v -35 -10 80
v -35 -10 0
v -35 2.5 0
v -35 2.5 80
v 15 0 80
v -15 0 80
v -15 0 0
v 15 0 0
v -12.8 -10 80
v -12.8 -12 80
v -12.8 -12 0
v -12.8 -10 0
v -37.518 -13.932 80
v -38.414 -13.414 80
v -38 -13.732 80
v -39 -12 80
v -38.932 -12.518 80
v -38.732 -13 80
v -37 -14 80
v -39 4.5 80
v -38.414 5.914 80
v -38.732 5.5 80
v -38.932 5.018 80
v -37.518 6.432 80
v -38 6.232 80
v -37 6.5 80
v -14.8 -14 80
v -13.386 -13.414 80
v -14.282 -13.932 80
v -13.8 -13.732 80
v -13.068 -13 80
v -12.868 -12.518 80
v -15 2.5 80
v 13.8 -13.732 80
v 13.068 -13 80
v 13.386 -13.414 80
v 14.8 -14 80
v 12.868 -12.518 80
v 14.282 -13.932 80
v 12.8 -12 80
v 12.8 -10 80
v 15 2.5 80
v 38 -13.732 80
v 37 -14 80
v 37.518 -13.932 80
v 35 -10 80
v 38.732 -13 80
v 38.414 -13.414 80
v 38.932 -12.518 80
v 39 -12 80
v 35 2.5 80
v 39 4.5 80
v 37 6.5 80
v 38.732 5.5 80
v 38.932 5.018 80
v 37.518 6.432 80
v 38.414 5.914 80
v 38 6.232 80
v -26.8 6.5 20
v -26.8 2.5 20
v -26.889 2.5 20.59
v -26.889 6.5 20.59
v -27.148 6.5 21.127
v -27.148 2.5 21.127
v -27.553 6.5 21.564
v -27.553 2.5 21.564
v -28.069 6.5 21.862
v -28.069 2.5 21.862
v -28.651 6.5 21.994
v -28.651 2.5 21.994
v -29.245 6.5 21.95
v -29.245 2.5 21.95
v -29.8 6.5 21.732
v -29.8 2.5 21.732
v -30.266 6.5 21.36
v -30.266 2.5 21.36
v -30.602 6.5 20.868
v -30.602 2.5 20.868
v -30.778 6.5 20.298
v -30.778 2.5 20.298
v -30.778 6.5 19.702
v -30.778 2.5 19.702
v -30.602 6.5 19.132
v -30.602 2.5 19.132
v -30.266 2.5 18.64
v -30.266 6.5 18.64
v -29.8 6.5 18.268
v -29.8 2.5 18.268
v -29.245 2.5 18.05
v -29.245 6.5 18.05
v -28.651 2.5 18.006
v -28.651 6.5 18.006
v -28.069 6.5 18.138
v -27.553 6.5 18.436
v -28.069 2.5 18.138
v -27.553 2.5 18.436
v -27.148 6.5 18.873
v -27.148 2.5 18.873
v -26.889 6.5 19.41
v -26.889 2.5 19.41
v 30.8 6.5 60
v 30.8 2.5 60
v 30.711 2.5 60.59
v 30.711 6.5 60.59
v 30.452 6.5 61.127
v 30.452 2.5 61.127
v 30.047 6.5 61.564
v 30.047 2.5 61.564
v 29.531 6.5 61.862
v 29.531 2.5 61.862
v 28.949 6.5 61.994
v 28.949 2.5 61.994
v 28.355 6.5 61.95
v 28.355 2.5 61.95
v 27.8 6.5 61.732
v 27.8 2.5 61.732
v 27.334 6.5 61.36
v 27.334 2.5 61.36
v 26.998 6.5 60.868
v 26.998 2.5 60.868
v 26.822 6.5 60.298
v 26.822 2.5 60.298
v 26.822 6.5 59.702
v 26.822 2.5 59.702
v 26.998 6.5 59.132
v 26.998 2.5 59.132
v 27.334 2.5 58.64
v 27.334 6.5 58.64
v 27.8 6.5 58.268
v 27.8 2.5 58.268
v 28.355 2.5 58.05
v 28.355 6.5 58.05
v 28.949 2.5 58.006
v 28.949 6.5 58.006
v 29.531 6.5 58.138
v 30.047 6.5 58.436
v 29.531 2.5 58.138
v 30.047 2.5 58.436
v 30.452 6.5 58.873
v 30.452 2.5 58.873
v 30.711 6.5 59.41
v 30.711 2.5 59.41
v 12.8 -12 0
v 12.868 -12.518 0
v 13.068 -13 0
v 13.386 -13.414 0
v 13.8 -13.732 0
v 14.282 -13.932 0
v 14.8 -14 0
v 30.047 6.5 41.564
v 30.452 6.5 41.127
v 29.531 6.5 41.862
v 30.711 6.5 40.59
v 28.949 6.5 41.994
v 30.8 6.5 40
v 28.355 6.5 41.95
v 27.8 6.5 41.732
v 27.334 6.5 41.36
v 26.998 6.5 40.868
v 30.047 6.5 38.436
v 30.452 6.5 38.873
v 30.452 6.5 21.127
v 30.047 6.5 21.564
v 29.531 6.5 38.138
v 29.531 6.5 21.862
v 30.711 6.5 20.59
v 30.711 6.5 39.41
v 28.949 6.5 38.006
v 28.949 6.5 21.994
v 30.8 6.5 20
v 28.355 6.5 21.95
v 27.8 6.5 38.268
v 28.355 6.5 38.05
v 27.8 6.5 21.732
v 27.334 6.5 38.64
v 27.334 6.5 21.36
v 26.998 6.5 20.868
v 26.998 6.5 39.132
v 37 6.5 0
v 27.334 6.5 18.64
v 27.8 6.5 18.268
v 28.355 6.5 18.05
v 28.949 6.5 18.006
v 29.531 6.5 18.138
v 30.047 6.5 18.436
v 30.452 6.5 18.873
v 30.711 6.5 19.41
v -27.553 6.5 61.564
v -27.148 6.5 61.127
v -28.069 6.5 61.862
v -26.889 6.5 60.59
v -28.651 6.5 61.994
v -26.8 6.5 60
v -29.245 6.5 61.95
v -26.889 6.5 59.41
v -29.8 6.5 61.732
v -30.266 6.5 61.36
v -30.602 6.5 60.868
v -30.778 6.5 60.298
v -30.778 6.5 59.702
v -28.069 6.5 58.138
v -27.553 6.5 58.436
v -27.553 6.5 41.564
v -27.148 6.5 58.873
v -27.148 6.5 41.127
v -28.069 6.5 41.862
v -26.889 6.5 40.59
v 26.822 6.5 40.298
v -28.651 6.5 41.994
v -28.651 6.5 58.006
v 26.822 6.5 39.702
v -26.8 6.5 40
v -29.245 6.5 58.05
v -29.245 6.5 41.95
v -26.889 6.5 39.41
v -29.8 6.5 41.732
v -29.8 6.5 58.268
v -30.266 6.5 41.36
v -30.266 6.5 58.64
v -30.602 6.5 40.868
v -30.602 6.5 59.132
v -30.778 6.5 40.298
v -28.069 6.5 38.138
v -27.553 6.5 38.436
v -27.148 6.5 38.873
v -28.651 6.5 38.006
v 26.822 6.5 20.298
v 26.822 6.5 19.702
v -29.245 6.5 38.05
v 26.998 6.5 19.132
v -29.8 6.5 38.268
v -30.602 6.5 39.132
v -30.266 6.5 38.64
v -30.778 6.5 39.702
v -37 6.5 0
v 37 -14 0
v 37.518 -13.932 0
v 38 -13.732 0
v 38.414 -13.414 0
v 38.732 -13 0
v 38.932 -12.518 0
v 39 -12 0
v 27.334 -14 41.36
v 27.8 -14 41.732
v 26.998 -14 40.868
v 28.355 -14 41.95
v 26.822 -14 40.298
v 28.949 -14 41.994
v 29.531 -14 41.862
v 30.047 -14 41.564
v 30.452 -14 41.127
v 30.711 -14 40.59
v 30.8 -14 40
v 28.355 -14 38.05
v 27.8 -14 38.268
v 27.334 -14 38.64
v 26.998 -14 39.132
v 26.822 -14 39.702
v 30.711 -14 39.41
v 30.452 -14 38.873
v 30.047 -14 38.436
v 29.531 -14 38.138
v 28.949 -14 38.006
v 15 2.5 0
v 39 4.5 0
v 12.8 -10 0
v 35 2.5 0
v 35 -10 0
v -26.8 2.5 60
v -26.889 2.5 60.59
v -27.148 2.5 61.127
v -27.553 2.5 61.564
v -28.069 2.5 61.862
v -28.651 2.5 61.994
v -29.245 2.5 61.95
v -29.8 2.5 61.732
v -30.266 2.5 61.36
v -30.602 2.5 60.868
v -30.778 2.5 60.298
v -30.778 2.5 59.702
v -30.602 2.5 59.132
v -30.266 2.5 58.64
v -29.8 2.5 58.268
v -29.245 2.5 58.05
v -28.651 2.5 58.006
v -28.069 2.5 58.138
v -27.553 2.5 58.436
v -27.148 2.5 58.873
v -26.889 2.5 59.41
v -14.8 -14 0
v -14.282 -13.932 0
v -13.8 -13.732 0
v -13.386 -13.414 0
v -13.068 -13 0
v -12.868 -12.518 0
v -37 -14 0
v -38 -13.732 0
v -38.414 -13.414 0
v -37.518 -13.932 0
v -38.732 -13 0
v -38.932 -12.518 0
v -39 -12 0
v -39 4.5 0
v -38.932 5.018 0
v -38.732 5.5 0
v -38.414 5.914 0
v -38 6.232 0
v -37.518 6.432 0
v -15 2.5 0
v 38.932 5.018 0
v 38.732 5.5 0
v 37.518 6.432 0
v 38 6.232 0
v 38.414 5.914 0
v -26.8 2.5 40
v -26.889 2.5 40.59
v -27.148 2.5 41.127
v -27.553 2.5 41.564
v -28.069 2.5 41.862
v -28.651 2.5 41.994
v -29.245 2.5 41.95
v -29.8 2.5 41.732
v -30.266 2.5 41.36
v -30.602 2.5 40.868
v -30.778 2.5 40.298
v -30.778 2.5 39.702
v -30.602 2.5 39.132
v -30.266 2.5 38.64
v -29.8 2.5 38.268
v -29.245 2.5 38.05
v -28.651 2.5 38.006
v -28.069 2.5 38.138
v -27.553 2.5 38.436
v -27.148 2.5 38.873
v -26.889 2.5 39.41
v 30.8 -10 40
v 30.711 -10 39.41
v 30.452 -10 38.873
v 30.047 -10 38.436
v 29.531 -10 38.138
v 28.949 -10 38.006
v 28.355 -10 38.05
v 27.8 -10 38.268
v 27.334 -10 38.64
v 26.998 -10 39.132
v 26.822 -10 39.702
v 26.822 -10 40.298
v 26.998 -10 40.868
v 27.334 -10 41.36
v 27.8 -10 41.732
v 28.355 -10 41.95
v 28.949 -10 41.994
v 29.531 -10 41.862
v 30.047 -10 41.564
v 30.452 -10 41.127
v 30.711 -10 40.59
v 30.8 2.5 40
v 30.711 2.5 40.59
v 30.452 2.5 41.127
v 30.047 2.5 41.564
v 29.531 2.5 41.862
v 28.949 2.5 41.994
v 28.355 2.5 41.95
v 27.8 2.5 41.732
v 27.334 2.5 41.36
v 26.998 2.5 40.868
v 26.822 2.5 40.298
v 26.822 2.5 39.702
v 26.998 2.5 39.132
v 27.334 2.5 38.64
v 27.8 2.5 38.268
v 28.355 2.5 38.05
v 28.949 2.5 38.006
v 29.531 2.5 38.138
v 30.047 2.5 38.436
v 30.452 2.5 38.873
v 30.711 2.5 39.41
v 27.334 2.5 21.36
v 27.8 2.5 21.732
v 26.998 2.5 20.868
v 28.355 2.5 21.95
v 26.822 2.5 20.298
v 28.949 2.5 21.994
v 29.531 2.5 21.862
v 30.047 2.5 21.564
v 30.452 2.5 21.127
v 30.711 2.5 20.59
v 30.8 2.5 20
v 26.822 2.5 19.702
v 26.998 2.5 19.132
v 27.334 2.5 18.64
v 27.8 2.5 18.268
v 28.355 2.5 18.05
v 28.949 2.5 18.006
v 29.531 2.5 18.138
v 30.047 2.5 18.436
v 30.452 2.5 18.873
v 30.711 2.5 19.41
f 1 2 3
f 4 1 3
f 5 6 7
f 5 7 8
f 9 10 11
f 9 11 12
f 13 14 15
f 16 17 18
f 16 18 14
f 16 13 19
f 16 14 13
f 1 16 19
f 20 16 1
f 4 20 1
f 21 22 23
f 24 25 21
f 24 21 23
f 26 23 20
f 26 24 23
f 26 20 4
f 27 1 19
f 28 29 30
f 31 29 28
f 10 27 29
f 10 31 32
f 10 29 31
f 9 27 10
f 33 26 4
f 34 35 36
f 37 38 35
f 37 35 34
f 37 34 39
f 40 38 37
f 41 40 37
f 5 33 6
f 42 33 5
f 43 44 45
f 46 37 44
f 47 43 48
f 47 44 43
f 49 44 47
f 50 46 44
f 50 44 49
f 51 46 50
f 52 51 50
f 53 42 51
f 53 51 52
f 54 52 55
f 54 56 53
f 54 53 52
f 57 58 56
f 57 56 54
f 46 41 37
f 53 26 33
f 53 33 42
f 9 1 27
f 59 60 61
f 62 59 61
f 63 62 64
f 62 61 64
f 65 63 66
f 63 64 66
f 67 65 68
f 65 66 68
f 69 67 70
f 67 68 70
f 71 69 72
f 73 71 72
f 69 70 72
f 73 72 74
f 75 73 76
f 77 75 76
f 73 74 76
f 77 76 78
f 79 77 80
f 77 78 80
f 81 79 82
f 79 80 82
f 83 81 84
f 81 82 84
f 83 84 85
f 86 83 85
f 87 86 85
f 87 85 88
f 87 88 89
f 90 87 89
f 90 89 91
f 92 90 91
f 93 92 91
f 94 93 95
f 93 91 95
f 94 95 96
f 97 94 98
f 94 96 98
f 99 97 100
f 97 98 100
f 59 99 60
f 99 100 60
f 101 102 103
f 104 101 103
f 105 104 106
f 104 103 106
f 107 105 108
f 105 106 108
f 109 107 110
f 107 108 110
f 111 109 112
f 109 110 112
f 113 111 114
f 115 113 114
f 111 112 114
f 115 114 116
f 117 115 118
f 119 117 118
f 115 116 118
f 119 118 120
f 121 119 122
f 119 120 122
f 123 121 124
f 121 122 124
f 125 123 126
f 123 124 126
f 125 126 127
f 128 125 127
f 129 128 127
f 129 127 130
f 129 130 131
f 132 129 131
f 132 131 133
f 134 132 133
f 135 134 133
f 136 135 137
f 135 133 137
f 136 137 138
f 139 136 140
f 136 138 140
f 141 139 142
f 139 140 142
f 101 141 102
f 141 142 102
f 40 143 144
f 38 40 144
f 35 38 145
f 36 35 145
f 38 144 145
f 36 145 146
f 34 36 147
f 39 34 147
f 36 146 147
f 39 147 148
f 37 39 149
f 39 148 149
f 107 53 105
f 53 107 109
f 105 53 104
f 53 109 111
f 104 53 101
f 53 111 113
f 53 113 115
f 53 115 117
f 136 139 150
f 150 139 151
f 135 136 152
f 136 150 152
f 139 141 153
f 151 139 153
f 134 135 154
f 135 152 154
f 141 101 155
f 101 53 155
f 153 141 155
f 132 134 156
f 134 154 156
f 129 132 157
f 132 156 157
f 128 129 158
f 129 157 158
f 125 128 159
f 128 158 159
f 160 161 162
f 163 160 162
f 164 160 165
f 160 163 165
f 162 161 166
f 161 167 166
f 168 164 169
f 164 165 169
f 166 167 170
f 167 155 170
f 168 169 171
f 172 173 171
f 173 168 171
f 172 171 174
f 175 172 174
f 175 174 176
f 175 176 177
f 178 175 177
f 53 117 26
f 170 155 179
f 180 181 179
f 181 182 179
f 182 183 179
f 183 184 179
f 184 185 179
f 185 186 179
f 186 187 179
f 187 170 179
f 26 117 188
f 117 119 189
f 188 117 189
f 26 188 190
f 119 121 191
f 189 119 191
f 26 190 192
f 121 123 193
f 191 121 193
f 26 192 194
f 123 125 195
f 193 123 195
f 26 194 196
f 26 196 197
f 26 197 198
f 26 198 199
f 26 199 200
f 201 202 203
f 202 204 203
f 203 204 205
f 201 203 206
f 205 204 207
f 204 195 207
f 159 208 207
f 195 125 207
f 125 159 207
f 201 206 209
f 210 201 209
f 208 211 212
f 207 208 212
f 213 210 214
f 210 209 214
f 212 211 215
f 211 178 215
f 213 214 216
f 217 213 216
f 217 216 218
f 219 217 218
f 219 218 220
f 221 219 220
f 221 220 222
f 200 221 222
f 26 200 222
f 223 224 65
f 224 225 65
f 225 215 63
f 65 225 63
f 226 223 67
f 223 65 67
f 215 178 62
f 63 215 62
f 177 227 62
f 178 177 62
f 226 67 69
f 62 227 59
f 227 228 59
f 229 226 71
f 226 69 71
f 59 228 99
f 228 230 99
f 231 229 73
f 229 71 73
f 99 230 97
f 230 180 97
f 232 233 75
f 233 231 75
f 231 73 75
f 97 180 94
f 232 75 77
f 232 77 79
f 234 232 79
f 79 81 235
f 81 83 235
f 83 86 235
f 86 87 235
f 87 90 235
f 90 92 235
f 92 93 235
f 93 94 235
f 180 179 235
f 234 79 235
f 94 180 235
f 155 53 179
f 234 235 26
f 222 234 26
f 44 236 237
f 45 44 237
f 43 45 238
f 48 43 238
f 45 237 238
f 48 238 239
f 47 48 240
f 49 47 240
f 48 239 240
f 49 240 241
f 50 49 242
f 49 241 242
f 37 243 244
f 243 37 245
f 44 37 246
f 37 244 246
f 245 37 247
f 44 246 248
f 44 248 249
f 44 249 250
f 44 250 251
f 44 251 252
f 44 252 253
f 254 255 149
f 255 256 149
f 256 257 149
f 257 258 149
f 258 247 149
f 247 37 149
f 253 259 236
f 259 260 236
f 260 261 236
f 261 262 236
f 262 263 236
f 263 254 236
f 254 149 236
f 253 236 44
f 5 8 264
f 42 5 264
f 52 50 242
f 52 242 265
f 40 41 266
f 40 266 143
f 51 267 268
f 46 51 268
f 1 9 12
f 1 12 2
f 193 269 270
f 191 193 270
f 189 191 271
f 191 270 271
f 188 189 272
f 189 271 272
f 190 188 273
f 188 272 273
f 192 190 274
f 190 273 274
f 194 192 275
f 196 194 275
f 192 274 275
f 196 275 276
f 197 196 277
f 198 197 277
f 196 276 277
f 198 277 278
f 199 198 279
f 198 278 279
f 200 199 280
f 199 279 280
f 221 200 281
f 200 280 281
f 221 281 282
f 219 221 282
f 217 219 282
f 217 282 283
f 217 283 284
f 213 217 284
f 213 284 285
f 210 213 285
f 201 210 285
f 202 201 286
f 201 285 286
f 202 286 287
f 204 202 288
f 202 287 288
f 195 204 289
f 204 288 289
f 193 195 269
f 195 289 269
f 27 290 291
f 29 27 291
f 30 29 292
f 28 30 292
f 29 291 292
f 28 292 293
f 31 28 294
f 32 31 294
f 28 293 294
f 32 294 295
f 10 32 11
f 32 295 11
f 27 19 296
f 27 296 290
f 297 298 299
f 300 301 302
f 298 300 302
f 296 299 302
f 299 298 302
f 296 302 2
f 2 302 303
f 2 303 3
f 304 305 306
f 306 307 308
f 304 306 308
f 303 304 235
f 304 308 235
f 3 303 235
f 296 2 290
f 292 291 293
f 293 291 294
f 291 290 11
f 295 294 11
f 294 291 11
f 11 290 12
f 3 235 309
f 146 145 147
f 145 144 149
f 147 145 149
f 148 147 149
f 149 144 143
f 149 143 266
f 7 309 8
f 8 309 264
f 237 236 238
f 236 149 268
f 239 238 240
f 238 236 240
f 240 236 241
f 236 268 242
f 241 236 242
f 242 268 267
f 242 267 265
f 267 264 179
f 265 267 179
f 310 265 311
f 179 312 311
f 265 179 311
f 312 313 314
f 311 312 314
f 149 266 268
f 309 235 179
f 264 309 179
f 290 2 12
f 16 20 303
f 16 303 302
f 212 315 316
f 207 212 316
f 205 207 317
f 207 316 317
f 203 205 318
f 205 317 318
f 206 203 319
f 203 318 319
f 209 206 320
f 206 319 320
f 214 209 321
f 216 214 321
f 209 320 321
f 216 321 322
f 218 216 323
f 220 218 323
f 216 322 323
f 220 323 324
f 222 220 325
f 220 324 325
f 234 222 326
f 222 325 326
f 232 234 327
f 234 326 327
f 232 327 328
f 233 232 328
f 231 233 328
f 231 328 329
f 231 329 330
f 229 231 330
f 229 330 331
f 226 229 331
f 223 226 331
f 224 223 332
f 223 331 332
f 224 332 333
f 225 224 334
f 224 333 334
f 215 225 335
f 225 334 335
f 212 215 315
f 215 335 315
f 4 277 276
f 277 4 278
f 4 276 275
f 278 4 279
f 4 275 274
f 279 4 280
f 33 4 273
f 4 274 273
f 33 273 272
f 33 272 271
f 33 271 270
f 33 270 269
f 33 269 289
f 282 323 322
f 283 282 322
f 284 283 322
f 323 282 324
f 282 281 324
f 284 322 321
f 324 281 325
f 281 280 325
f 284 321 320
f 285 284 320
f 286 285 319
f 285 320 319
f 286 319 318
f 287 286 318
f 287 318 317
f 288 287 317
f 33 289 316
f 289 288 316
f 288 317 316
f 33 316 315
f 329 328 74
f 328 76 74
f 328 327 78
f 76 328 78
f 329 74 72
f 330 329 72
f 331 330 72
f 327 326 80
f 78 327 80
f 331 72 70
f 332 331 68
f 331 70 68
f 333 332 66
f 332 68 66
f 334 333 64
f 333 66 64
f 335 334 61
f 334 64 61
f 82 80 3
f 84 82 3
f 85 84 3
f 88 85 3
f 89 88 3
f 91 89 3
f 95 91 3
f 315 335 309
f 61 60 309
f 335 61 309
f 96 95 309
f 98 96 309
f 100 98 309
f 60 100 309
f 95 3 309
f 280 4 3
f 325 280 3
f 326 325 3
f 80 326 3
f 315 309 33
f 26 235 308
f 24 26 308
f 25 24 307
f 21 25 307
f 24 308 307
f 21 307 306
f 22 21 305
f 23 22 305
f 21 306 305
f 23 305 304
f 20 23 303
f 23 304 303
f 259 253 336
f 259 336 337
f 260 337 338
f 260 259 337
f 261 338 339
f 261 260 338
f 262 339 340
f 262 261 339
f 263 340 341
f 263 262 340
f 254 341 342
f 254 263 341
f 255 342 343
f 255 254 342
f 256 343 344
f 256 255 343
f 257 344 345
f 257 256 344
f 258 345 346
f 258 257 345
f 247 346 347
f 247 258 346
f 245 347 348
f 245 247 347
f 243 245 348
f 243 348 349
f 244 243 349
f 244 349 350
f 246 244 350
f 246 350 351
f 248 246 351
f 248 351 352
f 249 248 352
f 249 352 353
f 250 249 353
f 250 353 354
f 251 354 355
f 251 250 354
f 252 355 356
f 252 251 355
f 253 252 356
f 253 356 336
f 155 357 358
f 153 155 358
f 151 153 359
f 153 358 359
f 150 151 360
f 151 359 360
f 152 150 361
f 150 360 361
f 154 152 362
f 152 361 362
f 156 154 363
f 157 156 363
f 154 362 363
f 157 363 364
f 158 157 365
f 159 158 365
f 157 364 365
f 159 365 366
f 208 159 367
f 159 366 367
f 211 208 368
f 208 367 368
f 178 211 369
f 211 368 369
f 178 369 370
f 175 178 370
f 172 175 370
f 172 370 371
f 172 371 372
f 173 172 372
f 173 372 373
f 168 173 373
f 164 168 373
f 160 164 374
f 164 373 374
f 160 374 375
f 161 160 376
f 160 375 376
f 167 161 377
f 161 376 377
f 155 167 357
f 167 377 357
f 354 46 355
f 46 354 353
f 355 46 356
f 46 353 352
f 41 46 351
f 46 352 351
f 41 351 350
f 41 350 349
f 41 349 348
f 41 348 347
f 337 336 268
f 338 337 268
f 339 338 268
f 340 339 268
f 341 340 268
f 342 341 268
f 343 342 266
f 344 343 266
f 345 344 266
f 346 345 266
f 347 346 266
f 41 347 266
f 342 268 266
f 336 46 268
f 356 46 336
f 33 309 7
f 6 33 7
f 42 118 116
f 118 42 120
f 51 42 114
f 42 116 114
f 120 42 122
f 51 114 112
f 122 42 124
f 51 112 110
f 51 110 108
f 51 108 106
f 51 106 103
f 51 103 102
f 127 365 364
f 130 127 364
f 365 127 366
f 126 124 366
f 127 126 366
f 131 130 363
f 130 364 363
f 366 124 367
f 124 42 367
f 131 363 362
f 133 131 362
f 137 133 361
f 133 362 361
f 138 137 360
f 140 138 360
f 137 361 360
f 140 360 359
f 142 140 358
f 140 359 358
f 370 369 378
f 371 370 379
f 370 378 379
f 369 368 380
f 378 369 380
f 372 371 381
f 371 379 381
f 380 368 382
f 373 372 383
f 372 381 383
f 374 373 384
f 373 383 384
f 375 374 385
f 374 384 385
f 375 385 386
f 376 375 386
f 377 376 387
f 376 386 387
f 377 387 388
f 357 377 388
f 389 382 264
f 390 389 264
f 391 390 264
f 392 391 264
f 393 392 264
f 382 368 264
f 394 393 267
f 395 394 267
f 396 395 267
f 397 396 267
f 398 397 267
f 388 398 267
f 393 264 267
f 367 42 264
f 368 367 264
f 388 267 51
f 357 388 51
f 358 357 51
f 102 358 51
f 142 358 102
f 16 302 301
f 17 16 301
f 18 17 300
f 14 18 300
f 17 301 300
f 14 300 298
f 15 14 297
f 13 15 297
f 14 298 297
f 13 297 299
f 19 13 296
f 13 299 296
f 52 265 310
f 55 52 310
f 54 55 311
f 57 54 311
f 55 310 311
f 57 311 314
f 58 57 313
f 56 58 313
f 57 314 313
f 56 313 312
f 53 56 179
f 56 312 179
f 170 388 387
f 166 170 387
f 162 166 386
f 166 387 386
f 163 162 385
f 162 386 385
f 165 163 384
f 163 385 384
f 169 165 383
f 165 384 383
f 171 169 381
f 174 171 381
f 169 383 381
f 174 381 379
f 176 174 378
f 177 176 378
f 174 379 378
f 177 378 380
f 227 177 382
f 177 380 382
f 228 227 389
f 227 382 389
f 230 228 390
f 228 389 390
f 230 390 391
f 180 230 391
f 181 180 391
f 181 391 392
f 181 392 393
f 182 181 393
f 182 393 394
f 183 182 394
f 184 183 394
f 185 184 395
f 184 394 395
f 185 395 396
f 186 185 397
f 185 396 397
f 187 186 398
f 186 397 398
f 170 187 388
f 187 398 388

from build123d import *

# Parameters (mm, degrees)
BOSS_EXTRUDE1_DEPTH = 80
SKETCH2_R           = 2
CUT_EXTRUDE1_DEPTH  = 4
CUT_EXTRUDE2_START  = -4
SKETCH3_R           = 2
CUT_EXTRUDE2_DEPTH  = 4


with BuildPart() as part:
    # Sketch1 → Boss-Extrude1 (new body)
    with BuildSketch(Plane.XY):
        with BuildLine():
            Line((-15, 0), (15, 0))
            Line((15, 0), (15, 2.5))
            Line((15, 2.5), (35, 2.5))
            Line((35, 2.5), (35, -10))
            Line((35, -10), (12.8, -10))
            Line((12.8, -10), (12.8, -12))
            ThreePointArc((12.8, -12), (13.385786438, -13.414213562), (14.8, -14))
            Line((14.8, -14), (37, -14))
            ThreePointArc((37, -14), (38.414213562, -13.414213562), (39, -12))
            Line((39, -12), (39, 4.5))
            ThreePointArc((39, 4.5), (38.414213562, 5.914213562), (37, 6.5))
            Line((37, 6.5), (15, 6.5))
            Line((15, 6.5), (-15, 6.5))
            Line((-15, 6.5), (-37, 6.5))
            ThreePointArc((-37, 6.5), (-38.414213562, 5.914213562), (-39, 4.5))
            Line((-39, 4.5), (-39, -12))
            ThreePointArc((-39, -12), (-38.414213562, -13.414213562), (-37, -14))
            Line((-37, -14), (-14.8, -14))
            ThreePointArc((-14.8, -14), (-13.385786438, -13.414213562), (-12.8, -12))
            Line((-12.8, -12), (-12.8, -10))
            Line((-12.8, -10), (-35, -10))
            Line((-35, -10), (-35, 2.5))
            Line((-35, 2.5), (-15, 2.5))
            Line((-15, 2.5), (-15, 0))
        make_face()
    extrude(amount=BOSS_EXTRUDE1_DEPTH)

    # Sketch2 → Cut-Extrude1 (cut)
    with BuildSketch(Plane.XZ.offset(-2.5)):
        with Locations((-28.8, 60)):
            Circle(SKETCH2_R)
        with Locations((28.8, 60)):
            Circle(SKETCH2_R)
        with Locations((28.8, 40)):
            Circle(SKETCH2_R)
        with Locations((28.8, 20)):
            Circle(SKETCH2_R)
        with Locations((-28.8, 40)):
            Circle(SKETCH2_R)
        with Locations((-28.8, 20)):
            Circle(SKETCH2_R)
    extrude(amount=-CUT_EXTRUDE1_DEPTH, mode=Mode.SUBTRACT)

    # Sketch3 → Cut-Extrude2 (cut)
    with BuildSketch(Plane(origin=(0, -10, 0), x_dir=(1, 0, 0), z_dir=(0, 1, 0)).offset(CUT_EXTRUDE2_START)):
        with Locations((28.8, -40)):
            Circle(SKETCH3_R)
    extrude(amount=CUT_EXTRUDE2_DEPTH, mode=Mode.SUBTRACT)


solid = part.part
